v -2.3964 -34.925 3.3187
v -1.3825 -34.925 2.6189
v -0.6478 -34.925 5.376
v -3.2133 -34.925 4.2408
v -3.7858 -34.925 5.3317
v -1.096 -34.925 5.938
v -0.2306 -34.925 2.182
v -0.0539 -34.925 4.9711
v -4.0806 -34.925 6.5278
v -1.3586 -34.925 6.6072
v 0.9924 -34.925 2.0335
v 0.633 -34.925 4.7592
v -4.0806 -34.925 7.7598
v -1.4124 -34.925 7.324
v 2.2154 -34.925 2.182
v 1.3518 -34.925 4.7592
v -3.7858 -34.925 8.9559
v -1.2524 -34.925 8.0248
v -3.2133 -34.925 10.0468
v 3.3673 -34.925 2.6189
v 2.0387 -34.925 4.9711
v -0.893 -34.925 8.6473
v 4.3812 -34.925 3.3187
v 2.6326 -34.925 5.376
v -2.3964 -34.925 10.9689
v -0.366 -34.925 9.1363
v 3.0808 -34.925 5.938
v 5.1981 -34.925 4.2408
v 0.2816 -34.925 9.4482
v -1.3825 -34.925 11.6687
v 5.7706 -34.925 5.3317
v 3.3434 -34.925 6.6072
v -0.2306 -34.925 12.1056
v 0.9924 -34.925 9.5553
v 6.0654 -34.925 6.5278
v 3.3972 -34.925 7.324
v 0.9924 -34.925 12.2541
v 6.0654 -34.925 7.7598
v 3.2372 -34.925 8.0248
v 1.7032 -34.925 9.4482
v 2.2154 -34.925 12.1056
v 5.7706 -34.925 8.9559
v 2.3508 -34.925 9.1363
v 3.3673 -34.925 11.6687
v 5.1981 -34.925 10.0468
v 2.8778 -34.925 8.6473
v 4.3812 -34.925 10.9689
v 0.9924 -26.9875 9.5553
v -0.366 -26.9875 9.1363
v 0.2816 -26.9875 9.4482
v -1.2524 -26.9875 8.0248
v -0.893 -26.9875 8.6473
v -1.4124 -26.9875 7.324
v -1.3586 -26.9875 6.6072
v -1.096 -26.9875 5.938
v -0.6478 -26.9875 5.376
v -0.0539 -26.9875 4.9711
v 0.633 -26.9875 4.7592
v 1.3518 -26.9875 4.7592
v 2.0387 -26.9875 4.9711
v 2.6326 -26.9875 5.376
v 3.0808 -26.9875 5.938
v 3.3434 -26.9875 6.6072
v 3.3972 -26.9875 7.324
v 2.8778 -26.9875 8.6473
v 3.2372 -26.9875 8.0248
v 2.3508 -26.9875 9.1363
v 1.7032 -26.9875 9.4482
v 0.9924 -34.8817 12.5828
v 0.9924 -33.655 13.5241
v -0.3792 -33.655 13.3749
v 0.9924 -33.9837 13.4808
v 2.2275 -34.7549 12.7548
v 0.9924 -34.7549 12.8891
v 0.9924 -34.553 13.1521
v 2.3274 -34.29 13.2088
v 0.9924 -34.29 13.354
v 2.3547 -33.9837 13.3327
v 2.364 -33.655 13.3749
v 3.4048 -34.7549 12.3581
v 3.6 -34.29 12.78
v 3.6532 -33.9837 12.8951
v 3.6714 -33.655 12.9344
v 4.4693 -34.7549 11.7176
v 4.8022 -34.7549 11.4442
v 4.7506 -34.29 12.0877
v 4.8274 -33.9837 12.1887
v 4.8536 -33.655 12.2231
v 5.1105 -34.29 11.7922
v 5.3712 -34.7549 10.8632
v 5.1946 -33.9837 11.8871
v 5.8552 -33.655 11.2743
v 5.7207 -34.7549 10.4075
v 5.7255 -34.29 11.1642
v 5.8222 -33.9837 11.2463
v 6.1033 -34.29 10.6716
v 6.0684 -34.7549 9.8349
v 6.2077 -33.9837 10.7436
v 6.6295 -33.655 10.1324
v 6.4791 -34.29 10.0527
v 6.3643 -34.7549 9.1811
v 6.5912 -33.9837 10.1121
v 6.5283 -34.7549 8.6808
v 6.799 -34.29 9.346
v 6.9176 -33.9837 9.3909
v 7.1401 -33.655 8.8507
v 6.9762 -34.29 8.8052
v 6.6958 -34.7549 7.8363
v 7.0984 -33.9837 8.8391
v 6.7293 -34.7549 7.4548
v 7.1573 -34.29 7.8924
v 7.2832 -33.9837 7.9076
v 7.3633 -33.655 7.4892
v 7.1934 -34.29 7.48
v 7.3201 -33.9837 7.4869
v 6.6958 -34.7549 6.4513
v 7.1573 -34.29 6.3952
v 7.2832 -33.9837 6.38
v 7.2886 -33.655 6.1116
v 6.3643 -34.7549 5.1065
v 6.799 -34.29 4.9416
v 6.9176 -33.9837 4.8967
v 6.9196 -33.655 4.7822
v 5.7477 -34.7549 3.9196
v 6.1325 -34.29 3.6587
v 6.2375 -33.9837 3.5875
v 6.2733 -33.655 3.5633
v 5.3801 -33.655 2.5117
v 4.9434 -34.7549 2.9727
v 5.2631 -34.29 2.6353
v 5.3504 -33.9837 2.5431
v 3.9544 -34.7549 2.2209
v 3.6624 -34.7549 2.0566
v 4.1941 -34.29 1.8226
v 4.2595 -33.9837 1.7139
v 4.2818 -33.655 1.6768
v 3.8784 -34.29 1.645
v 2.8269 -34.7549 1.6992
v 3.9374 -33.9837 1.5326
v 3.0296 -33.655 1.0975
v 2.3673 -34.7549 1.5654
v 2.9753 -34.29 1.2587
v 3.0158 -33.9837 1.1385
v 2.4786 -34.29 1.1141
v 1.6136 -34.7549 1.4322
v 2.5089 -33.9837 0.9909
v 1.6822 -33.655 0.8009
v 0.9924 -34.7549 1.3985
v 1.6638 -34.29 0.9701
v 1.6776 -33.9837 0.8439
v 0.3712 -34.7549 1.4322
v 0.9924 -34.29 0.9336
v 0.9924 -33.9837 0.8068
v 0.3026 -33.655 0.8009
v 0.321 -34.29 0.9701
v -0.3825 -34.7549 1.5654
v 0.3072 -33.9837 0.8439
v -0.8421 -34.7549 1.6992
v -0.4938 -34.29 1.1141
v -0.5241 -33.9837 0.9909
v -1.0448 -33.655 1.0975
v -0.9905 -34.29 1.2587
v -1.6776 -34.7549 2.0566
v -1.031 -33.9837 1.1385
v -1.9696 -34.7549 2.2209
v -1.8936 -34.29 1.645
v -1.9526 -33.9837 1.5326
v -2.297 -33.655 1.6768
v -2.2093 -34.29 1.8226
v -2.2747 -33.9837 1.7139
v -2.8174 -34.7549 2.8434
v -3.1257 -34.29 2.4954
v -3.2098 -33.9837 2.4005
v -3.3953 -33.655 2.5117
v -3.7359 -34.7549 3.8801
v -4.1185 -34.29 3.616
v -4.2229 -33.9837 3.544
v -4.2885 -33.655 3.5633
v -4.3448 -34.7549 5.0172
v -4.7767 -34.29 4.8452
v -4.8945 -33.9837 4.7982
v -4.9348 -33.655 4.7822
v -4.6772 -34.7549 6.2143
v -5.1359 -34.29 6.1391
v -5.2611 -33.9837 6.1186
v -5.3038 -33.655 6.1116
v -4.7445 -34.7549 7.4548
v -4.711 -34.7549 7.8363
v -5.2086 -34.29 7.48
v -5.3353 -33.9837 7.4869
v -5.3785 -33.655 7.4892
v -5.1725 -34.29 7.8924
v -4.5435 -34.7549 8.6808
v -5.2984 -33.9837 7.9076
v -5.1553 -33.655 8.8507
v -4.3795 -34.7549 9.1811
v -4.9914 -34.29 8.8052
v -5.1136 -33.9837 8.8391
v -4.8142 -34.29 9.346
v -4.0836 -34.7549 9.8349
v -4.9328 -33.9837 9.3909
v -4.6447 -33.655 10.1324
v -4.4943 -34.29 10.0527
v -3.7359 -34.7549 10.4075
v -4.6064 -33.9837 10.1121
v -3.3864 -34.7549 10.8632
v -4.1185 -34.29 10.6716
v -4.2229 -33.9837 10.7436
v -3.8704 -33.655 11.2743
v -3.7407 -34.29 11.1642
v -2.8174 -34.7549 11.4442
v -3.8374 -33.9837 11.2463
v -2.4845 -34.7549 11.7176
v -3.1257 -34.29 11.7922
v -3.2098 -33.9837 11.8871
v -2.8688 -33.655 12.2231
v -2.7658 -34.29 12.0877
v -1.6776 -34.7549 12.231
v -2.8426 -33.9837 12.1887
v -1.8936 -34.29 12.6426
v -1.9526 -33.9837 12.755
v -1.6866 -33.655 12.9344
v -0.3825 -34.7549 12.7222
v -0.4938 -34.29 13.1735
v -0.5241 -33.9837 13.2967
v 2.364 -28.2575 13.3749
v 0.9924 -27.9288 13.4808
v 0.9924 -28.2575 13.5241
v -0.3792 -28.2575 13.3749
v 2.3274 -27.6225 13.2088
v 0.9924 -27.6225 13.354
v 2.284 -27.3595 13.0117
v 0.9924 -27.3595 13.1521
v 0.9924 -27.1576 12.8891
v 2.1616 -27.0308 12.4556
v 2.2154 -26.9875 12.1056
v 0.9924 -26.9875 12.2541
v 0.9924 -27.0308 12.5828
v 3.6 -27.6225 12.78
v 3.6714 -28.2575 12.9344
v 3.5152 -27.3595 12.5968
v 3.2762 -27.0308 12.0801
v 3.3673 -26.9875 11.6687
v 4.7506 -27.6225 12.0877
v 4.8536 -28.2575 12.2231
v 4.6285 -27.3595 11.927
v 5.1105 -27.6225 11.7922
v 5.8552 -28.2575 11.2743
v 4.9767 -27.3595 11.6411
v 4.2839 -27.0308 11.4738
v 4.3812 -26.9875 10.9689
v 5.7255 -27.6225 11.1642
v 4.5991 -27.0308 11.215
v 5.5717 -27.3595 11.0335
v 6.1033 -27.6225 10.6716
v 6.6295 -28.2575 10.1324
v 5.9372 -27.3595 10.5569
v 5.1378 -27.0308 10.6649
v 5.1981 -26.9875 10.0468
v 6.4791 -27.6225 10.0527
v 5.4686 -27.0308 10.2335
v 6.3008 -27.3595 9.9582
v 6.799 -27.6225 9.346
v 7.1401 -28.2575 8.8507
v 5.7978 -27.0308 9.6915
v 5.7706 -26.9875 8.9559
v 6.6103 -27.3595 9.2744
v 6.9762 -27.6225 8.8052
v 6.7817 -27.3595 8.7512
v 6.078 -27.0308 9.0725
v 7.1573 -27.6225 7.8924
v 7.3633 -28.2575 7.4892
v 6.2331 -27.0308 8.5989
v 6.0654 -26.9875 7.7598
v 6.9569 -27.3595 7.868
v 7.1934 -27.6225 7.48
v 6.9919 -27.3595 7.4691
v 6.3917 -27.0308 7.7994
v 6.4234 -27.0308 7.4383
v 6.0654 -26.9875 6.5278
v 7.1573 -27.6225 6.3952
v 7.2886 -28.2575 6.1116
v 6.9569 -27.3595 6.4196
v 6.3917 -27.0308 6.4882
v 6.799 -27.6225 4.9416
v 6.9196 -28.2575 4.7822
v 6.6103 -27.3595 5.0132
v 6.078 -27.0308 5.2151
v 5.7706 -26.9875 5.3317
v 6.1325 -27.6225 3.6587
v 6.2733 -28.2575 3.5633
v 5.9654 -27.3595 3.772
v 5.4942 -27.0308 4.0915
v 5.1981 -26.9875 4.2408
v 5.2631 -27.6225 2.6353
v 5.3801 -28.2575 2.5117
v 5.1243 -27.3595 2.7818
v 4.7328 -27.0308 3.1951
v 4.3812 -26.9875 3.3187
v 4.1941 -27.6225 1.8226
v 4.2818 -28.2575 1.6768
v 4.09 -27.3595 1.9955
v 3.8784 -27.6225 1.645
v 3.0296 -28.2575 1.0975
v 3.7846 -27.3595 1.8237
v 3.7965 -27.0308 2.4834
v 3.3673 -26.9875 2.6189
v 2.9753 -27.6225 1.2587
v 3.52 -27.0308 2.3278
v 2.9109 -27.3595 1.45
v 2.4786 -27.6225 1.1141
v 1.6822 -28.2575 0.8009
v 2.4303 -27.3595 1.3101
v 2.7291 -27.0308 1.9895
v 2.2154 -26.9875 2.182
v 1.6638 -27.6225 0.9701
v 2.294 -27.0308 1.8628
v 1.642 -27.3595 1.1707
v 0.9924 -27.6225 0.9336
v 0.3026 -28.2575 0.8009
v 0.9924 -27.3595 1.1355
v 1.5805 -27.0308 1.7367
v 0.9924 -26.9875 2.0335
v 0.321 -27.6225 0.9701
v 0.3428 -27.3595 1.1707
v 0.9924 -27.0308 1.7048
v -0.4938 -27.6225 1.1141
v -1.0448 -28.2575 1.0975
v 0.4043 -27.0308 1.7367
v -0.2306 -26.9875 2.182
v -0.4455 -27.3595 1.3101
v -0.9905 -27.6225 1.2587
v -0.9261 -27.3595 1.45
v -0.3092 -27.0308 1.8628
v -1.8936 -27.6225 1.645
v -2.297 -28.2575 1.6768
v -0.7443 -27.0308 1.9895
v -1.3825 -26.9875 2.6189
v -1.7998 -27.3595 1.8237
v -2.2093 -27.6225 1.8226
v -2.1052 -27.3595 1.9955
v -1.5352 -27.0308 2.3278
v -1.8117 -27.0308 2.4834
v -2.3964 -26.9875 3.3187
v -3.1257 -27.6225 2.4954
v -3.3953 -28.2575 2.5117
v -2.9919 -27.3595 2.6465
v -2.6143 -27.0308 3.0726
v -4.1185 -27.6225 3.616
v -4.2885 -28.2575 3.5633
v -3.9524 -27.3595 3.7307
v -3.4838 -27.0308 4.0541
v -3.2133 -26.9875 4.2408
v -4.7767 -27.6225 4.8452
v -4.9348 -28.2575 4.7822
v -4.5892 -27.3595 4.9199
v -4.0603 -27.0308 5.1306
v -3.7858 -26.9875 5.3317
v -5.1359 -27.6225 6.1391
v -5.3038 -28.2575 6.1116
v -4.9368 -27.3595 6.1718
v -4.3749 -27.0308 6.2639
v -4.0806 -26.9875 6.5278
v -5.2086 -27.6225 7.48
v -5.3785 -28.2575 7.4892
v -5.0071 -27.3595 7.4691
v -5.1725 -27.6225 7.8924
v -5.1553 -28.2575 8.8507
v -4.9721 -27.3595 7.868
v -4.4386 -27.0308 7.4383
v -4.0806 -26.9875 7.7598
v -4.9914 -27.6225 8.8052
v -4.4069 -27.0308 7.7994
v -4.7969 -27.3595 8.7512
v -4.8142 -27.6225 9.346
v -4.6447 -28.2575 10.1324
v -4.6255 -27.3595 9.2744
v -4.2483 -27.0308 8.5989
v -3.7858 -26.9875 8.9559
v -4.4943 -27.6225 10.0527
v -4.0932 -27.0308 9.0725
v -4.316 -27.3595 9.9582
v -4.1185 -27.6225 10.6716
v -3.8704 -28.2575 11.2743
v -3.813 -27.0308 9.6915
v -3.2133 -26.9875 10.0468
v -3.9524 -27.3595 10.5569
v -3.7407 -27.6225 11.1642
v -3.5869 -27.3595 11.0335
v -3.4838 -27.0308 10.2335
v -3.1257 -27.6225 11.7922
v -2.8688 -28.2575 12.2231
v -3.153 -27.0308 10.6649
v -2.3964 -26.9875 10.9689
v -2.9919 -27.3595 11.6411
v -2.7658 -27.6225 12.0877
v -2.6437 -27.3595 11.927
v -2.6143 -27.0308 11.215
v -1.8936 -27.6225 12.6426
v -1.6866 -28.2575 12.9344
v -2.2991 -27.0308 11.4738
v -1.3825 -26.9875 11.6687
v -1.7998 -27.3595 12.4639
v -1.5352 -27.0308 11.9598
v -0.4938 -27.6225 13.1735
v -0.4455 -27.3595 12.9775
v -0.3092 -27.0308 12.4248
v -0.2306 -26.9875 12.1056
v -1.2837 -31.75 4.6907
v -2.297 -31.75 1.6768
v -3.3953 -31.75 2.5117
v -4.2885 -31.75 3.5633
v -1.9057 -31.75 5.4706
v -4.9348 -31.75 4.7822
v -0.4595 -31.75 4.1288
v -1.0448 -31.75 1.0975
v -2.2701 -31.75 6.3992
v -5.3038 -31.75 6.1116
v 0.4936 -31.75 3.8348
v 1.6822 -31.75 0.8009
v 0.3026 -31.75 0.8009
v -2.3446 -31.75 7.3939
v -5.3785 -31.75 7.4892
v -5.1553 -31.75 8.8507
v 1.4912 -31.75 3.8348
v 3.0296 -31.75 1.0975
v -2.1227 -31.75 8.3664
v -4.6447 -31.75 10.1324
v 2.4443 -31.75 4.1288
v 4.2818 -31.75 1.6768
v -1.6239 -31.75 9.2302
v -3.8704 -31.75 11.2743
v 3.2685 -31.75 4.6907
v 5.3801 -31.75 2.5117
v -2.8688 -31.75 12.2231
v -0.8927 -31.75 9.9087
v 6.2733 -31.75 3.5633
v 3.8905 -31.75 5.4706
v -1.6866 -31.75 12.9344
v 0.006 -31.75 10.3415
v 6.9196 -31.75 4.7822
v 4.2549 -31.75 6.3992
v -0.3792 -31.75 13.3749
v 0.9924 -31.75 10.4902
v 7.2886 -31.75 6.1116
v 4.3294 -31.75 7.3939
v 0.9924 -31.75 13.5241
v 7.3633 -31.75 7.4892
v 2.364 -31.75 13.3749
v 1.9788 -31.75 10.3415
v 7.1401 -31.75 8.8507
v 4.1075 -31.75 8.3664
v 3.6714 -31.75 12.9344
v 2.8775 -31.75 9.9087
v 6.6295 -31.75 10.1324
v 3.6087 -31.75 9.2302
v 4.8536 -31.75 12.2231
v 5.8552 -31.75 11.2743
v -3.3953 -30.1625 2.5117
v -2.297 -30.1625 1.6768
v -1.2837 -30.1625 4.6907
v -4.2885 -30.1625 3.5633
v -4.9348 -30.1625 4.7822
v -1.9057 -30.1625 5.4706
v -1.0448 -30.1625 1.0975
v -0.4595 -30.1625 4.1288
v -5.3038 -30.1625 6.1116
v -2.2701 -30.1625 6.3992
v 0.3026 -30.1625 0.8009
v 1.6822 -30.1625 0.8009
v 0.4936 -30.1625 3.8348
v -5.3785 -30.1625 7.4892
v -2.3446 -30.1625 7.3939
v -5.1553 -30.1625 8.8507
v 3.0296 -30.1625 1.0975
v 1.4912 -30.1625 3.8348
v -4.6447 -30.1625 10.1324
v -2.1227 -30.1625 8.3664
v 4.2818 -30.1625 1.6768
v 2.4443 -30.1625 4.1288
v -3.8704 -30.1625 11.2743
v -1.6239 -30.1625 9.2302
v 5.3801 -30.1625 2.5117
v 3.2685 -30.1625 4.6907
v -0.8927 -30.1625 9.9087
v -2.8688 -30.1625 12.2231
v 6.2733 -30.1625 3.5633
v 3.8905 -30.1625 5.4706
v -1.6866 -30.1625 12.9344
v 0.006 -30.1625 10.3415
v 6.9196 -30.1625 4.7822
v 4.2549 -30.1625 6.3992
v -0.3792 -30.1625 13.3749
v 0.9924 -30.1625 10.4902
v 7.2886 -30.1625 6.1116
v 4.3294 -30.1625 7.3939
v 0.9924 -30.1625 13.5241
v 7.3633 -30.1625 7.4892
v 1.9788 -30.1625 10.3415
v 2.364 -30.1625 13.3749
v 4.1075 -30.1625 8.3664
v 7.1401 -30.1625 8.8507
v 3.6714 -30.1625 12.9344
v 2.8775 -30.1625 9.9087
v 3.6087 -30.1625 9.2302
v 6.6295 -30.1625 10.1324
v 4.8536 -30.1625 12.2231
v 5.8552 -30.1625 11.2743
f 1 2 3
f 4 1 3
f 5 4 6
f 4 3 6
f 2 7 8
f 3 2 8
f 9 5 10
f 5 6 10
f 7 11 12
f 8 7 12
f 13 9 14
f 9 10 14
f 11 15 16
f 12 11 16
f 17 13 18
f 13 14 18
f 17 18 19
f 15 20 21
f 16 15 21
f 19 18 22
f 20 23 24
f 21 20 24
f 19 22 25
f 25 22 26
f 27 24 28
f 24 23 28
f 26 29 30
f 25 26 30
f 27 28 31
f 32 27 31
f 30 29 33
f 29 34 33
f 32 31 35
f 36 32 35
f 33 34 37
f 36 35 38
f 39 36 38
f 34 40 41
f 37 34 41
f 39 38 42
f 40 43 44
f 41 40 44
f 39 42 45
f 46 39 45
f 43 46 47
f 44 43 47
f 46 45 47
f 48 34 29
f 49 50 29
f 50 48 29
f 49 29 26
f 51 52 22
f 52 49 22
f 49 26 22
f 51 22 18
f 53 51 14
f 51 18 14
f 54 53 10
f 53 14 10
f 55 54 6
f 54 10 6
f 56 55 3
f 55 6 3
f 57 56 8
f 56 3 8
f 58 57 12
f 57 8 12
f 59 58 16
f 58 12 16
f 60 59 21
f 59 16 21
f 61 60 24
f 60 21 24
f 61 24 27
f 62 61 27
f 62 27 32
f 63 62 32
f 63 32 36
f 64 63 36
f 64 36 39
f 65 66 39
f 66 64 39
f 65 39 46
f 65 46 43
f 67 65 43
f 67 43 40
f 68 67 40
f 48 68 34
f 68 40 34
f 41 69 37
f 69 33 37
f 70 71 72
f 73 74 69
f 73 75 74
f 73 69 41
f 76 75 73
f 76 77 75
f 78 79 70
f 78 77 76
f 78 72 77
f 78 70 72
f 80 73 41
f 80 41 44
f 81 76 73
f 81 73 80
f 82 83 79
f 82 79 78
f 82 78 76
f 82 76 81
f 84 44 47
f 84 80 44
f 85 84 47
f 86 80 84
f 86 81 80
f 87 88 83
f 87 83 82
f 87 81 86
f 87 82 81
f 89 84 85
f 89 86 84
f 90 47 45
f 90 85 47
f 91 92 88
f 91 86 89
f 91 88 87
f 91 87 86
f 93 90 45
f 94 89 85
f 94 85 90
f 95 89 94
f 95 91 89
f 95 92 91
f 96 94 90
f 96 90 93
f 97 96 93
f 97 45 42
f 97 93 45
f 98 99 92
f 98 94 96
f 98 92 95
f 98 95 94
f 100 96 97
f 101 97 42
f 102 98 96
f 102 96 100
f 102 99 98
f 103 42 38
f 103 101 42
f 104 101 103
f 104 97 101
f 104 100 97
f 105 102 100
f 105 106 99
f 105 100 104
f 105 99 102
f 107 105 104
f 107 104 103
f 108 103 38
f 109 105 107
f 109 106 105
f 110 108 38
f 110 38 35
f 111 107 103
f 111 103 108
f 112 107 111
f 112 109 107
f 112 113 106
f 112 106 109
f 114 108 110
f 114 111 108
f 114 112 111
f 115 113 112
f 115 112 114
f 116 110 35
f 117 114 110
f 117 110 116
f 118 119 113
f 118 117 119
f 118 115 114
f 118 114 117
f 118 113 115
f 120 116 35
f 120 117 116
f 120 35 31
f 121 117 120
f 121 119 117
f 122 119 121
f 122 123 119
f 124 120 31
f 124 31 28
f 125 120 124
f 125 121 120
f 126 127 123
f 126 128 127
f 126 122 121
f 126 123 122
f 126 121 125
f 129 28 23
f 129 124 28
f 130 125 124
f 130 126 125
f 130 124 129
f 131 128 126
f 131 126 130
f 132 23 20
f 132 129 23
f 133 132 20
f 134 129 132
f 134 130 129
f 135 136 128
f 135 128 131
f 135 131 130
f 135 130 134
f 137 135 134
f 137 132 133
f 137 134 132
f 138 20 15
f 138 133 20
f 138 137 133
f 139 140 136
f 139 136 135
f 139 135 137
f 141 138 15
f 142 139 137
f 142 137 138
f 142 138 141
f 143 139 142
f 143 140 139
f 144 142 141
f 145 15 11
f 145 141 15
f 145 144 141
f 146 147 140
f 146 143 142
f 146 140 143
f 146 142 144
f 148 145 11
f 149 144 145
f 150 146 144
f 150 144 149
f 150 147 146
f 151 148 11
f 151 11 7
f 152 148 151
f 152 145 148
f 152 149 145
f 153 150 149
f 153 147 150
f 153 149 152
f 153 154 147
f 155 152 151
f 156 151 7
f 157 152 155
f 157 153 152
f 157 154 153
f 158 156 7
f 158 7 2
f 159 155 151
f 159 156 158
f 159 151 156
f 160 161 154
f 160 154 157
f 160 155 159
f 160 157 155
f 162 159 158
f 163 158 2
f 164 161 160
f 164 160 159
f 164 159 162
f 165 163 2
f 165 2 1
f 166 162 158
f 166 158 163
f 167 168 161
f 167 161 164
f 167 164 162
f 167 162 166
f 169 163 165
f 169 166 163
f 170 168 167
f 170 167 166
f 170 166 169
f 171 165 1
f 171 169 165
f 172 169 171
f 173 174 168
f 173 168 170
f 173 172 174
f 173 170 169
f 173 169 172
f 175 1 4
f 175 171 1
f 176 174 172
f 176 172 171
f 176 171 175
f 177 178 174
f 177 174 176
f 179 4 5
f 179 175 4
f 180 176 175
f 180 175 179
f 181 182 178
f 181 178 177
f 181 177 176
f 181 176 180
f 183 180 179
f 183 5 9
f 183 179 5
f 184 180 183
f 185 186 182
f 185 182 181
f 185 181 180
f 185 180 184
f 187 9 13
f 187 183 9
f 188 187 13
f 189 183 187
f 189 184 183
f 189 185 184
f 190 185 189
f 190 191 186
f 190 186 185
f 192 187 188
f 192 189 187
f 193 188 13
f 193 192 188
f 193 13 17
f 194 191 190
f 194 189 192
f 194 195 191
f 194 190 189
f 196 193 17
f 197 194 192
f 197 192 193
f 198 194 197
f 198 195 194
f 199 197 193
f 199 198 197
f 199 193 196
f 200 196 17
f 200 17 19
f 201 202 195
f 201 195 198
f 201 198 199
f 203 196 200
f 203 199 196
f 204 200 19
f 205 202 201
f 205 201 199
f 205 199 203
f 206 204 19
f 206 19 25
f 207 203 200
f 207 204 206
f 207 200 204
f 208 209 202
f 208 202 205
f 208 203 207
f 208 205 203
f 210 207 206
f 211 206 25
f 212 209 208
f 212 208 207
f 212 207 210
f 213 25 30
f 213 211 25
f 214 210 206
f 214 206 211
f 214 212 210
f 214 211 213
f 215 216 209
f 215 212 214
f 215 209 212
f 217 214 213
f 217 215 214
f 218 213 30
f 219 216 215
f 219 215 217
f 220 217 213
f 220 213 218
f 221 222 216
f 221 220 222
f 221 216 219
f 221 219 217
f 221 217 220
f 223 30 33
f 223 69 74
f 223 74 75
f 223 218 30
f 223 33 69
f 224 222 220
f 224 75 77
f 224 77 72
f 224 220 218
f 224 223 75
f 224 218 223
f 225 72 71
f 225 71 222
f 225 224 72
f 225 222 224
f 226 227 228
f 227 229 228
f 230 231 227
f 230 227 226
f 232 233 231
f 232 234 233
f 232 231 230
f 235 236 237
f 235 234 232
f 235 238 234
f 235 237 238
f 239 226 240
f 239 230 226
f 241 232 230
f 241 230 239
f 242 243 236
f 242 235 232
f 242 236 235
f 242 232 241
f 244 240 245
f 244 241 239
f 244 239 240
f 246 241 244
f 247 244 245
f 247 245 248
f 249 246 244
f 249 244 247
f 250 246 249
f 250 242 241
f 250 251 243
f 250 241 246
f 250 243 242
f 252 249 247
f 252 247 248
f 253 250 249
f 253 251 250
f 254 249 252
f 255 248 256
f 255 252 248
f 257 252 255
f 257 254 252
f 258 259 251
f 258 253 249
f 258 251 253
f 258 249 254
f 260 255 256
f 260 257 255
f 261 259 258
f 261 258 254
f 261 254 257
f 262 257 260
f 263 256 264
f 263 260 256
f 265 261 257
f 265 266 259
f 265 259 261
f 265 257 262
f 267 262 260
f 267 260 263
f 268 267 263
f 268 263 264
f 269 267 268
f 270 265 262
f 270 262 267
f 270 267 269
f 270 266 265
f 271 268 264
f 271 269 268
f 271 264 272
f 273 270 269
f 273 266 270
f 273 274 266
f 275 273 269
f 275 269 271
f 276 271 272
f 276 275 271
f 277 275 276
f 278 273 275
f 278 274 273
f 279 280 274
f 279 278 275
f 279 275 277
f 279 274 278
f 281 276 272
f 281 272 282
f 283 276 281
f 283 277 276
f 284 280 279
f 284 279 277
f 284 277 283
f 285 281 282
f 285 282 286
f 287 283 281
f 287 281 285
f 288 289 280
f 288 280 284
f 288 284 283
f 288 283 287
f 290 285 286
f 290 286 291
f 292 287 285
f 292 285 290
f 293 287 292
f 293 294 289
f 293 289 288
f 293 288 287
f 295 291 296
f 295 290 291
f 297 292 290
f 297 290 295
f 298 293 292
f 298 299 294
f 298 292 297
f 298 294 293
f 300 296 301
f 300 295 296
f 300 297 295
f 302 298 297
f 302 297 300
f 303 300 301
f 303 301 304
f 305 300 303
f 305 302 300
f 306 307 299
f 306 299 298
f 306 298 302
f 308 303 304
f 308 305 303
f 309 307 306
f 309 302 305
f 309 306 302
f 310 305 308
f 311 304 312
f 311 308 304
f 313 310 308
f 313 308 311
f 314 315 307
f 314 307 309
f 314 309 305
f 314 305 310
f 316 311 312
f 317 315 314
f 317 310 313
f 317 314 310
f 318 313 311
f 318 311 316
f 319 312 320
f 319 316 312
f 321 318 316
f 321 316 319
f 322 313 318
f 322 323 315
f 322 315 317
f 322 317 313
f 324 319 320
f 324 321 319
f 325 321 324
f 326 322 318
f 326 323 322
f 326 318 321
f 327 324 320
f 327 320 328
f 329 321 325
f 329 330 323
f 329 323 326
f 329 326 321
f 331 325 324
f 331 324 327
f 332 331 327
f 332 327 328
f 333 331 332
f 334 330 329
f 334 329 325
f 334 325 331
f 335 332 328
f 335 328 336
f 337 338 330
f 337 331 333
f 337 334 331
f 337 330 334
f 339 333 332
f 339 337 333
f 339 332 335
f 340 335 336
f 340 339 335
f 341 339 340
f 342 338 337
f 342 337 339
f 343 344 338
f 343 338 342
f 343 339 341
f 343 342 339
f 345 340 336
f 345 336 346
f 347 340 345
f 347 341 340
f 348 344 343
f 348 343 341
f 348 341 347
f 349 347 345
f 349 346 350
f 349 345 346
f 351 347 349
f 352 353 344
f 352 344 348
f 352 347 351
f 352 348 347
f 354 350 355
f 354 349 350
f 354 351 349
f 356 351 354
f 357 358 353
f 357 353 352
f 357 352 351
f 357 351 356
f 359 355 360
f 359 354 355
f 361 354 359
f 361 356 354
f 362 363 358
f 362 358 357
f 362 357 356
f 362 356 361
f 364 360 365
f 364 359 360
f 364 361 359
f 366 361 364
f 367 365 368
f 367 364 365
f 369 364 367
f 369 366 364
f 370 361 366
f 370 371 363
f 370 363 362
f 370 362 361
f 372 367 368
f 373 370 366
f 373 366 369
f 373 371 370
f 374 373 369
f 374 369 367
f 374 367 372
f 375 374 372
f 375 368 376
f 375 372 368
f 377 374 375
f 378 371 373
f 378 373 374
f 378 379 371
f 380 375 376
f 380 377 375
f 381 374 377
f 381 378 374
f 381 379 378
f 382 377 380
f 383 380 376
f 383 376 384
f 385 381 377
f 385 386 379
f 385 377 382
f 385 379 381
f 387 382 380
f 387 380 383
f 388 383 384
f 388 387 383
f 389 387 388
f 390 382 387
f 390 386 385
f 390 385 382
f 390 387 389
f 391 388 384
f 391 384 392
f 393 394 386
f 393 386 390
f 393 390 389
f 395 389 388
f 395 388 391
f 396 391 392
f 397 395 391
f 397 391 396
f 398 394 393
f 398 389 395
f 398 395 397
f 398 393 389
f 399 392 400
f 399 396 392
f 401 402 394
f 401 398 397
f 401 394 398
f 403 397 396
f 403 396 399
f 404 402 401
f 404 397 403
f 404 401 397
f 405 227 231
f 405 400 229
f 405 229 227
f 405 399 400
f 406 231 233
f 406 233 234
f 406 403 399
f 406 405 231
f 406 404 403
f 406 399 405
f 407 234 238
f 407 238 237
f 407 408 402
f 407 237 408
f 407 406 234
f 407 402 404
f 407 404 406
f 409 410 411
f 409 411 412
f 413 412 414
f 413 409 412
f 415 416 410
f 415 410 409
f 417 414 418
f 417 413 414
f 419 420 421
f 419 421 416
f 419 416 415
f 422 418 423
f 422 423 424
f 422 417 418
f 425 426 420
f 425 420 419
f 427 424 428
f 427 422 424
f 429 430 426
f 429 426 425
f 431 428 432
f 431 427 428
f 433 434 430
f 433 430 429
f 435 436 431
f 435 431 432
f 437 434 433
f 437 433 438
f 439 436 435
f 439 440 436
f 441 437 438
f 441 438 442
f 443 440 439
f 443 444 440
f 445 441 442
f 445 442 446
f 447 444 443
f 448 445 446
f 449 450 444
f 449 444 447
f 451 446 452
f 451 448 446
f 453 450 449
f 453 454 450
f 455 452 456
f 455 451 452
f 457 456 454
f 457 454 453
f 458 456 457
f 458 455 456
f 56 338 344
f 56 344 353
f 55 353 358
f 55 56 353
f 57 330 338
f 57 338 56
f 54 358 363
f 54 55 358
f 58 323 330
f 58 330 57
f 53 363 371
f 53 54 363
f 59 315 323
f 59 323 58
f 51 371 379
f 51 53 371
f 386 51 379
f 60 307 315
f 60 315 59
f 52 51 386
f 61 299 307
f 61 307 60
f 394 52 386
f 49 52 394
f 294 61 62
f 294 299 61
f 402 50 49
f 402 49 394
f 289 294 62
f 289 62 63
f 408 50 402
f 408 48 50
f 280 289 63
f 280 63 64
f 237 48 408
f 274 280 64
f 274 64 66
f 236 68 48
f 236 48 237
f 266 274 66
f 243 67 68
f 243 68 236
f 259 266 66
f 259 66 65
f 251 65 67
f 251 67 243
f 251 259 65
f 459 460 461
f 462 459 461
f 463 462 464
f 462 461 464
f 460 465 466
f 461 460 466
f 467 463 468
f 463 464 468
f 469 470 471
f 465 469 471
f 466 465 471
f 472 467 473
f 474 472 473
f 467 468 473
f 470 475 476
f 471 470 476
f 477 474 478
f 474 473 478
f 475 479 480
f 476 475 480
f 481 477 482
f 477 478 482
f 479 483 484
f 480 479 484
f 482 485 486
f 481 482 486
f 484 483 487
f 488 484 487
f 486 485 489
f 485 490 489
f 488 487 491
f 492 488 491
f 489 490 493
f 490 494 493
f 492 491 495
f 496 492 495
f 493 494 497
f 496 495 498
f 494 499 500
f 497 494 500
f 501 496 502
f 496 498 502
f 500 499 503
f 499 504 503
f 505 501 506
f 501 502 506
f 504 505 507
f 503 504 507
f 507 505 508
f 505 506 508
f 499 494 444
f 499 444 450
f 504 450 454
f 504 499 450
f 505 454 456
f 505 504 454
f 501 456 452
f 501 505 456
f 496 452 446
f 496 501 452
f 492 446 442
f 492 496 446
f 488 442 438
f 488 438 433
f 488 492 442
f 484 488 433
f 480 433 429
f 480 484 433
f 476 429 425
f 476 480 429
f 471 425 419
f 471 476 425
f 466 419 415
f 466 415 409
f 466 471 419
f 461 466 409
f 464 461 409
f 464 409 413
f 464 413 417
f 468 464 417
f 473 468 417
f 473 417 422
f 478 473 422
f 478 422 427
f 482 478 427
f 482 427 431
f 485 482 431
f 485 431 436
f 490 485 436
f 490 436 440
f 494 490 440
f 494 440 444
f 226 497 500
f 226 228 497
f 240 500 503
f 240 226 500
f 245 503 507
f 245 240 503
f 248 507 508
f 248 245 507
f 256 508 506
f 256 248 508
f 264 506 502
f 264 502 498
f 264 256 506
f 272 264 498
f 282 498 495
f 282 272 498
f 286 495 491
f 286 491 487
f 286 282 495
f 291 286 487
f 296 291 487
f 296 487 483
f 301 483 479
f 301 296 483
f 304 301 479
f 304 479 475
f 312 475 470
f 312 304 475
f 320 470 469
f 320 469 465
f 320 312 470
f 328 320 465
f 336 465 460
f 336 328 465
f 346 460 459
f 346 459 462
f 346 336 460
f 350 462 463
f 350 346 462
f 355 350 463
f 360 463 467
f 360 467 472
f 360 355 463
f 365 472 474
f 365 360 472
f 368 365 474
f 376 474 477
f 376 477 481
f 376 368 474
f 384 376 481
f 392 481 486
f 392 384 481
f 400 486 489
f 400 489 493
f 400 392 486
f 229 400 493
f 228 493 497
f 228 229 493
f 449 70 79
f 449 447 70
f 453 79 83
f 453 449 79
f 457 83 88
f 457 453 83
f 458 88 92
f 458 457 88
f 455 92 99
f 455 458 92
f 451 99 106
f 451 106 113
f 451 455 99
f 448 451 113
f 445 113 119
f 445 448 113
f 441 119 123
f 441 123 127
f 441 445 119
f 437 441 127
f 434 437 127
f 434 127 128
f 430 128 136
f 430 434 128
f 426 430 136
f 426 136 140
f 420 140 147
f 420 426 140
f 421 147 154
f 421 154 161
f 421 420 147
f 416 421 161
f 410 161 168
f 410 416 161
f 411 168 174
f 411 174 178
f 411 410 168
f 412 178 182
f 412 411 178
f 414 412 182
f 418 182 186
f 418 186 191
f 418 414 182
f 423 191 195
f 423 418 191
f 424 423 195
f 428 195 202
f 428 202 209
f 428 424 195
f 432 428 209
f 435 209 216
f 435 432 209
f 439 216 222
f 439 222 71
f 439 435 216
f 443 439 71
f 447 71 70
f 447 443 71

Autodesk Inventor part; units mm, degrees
ref_plane "YZ Plane" through (0, 0, 0) normal (1, 0, 0) x (0, 1, 0)
ref_plane "XZ Plane" through (0, 0, 0) normal (0, 1, 0) x (-1, 0, 0)
ref_plane "XY Plane" through (0, 0, 0) normal (0, 0, 1) x (1, 0, 0)
ref_plane "Work Plane2" through (0.9924, -30.1625, 6.35) normal (-1, 0, 0) x (0, -1, 0)
sketch "Sketch2" plane through (0.9924, -30.1625, 6.35) normal (-1, 0, 0) x (0, -1, 0)
  line L0 (0, -5.5563) -> (0, 3.175) projected
  line L1 (1.5875, -7.1437) -> (1.5875, 3.175) projected
  line L2 (0, 7.1741) -> (-1.905, 7.1741)
  line L3 (-3.175, 5.9041) -> (-3.175, 3.2053)
  arc A0 (-1.905, 7.1741) -> (-3.175, 5.9041) centre (-1.905, 5.9041) ccw
  line L4 (12.0631, 0.7938) -> (-37.2001, 0.7938) projected
  line L5 (-3.175, 3.2053) -> (4.7625, 3.2053)
  line L6 (4.7625, 3.2053) -> (4.7625, 5.9041)
  line L7 (3.4925, 7.1741) -> (1.5875, 7.1741)
  arc A1 (4.7625, 5.9041) -> (3.4925, 7.1741) centre (3.4925, 5.9041) ccw
  line L8 (1.5875, 4.1402) -> (0, 4.1402)
  line L9 (0, 7.1741) -> (0, 4.1402)
  line L10 (1.5875, 7.1741) -> (1.5875, 4.1402)
  point P0 (-30.1625, -6.35)
  point P1 (0, 2.5527)
  point P2 (0, 2.0373)
  point P3 (1.5875, 2.5527)
  dimension "d0" = 1.27
  dimension "d2" = 1.27
  dimension "d4" = 3.9688
  dimension "d5" = 7.9375
revolve "Revolution1" add sketch "Sketch2" angle 360 about axis through (0.9924, -20.447, 7.1438) along (0, 1, 0)
ref_plane "Work Plane3" through (0.9924, -30.9563, 7.1438) normal (0, 0, -1) x (0, -1, 0)
properties part number "Pneumatic_VIAIAR_00090_05"
